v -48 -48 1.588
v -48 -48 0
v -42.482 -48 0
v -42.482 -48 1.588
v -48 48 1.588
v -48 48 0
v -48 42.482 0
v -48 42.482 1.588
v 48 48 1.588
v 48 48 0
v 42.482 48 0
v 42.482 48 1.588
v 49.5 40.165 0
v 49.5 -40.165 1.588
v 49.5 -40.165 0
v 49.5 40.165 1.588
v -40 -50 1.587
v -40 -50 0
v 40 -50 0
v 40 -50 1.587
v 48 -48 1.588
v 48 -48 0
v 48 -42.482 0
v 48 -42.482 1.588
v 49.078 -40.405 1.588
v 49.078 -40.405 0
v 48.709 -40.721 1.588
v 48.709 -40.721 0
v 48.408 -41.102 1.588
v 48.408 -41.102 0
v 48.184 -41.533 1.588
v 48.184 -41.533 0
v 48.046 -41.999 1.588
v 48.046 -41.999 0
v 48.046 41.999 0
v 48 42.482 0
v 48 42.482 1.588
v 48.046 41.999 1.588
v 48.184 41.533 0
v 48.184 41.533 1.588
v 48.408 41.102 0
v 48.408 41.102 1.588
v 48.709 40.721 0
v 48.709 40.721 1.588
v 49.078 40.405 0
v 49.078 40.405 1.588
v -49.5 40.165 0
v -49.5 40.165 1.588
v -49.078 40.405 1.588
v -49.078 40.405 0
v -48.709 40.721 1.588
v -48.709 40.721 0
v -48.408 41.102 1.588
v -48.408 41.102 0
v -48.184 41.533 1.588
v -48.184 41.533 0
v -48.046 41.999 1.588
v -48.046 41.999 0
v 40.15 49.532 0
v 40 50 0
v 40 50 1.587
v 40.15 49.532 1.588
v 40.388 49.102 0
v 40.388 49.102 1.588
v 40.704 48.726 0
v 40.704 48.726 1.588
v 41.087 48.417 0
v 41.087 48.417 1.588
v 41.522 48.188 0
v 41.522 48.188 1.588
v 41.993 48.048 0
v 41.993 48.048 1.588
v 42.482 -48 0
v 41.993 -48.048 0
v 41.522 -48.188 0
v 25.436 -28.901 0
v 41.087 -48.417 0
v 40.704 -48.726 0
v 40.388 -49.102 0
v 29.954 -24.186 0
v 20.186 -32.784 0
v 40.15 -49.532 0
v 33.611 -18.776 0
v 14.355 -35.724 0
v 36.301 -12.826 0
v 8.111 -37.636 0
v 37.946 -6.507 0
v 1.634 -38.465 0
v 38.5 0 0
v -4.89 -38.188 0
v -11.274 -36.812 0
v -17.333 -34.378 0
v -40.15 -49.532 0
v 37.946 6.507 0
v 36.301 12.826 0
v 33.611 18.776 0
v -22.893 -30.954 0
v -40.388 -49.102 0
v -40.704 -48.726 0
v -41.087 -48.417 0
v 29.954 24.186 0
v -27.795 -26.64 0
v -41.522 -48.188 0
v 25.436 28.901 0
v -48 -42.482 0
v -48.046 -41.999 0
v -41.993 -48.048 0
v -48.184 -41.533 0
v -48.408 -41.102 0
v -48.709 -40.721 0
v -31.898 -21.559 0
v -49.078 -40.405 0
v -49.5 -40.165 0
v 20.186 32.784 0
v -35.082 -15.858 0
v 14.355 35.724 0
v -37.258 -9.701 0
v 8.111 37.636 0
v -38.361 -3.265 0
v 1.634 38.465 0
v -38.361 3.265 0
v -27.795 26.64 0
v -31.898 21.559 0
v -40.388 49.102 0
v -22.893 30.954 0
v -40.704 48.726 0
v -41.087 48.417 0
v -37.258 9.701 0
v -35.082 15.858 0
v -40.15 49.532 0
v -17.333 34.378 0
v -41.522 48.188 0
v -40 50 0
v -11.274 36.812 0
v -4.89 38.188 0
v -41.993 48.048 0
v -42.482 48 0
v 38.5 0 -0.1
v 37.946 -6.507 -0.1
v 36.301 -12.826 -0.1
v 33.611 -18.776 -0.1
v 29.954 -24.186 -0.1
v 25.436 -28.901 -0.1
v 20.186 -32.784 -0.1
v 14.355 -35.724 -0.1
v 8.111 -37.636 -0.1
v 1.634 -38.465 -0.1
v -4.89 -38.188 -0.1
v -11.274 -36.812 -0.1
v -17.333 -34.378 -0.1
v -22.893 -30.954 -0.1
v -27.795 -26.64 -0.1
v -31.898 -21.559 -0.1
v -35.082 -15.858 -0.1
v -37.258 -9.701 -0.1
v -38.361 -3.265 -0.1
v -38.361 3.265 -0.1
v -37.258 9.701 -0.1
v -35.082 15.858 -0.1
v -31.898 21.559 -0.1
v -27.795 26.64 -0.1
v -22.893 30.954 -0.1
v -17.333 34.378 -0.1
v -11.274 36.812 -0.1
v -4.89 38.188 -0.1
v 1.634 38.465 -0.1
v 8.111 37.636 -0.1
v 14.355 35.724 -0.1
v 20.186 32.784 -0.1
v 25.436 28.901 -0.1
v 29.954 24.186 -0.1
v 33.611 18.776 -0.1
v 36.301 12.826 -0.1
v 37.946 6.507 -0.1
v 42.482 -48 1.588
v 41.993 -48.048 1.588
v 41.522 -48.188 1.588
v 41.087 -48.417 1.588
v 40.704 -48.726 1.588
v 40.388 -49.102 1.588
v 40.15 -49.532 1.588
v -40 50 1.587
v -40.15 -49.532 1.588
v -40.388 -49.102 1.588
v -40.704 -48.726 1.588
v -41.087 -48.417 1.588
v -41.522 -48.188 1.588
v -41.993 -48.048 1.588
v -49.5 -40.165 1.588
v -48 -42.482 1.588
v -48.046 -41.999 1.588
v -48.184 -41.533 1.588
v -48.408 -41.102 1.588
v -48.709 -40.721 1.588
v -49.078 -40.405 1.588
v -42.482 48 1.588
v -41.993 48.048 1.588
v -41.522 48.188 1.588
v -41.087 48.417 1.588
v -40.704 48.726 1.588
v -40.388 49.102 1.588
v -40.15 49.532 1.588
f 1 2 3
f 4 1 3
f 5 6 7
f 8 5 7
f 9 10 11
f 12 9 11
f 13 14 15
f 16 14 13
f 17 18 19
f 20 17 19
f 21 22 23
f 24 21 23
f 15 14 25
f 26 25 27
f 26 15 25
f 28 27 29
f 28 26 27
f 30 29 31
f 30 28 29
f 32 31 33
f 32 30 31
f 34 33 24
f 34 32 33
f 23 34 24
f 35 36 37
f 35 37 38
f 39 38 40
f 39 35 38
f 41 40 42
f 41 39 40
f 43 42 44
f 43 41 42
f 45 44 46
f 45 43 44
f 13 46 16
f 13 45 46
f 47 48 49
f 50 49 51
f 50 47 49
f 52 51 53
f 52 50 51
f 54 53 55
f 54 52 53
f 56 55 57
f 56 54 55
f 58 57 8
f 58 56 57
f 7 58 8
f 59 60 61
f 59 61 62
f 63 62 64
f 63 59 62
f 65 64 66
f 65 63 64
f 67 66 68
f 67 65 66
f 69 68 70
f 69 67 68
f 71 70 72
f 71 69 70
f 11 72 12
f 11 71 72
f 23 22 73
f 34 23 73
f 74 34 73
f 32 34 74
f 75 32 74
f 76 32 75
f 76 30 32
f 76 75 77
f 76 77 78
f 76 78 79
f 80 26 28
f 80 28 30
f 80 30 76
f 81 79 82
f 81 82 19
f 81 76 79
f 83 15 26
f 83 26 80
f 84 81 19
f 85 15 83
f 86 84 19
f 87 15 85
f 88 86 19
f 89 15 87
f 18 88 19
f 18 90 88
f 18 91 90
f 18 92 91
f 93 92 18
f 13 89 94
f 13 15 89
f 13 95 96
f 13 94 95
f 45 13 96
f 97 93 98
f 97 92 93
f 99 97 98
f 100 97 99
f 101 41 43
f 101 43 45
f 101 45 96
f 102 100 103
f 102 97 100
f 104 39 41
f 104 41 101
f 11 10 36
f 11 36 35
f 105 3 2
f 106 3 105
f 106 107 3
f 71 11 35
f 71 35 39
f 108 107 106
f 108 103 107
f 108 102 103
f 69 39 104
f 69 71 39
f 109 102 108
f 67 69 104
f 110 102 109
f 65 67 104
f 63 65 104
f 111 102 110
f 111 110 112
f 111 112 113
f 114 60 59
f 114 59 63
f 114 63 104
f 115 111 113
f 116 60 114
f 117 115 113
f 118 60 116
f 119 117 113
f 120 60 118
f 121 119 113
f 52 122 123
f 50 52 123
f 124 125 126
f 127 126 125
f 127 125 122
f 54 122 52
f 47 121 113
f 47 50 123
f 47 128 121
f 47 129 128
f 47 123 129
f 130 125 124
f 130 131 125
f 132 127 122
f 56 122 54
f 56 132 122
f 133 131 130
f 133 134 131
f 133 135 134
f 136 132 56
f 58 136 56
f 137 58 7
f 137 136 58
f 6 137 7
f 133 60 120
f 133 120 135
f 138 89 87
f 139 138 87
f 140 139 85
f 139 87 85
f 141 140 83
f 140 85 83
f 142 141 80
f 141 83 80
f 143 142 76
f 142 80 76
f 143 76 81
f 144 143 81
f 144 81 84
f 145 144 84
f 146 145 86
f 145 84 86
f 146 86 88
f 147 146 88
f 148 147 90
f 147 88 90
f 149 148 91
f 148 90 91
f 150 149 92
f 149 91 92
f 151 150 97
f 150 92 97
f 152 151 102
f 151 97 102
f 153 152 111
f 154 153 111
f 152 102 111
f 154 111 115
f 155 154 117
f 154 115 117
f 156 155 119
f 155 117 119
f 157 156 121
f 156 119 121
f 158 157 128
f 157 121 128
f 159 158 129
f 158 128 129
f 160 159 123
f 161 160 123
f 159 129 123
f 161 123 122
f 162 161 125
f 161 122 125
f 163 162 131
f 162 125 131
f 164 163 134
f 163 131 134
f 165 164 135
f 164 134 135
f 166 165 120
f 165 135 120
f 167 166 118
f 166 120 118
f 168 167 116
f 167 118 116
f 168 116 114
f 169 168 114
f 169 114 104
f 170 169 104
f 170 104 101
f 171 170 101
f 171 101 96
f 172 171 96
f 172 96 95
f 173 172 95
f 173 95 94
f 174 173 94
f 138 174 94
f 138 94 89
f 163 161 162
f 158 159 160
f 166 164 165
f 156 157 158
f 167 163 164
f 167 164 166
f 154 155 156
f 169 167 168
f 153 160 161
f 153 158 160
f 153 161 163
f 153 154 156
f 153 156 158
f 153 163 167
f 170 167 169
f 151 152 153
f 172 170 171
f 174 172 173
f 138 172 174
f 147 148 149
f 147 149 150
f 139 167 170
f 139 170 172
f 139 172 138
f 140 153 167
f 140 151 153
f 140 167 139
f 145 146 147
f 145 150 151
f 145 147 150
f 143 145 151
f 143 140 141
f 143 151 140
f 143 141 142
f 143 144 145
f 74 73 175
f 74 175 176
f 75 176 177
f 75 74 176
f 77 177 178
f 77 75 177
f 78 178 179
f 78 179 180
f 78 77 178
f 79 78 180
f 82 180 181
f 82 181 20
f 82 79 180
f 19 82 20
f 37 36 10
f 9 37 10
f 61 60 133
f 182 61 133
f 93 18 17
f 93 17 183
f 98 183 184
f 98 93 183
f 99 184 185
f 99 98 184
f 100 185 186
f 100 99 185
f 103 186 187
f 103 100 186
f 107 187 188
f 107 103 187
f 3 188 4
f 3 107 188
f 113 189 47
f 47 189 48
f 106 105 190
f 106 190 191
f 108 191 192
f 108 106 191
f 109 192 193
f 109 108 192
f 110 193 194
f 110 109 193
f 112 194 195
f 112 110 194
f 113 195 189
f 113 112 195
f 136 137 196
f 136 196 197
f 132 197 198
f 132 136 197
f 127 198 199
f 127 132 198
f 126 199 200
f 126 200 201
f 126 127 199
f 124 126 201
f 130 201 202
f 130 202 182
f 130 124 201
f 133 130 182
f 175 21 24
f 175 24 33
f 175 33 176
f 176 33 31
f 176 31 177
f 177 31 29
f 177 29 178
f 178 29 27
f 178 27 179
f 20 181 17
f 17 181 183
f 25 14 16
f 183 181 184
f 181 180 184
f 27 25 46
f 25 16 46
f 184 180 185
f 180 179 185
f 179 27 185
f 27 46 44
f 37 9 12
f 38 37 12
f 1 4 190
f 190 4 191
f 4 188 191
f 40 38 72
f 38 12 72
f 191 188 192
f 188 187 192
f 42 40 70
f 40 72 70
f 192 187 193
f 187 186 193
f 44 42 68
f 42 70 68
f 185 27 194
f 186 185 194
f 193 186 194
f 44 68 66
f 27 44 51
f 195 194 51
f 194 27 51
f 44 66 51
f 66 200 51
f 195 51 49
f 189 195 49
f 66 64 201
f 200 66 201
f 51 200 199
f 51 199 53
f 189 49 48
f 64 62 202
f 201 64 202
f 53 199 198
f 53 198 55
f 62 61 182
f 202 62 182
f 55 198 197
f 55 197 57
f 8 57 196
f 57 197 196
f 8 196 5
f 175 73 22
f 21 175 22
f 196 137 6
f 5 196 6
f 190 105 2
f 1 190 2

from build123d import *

# Parameters (mm, degrees)
BOSS_EXTRUDE1_DEPTH = 1.5875
FILLET1_R           = 2.54
SKETCH6_OUTSIDE_W   = 130.286
SKETCH6_OUTSIDE_H   = 130.286
SKETCH6_OUTSIDE_W_2 = 99
SKETCH6_OUTSIDE_H_2 = 100
CUT_EXTRUDE2_DEPTH  = 71.728496069
SKETCH7_R           = 38.5
BOSS_EXTRUDE2_DEPTH = 0.1


with BuildPart() as part:
    # Sketch1 → Boss-Extrude1 (new body)
    with BuildSketch(Plane.XY):
        Polygon((40, 50), (-40, 50), (-40, 48), (-48, 48), (-48, 40), (-50, 40), (-50, -37.864895224), (-50, -40), (-48, -40), (-48, -48), (-40, -48), (-40, -50), (-37.864895224, -50), (40, -50), (40, -48), (48, -48), (48, -40), (50, -40), (50, 40), (48, 40), (48, 48), (40, 48), align=None)
    extrude(amount=BOSS_EXTRUDE1_DEPTH)

    # Fillet1
    # the kernel refuses this fillet: 2.54 mm, written as the material it adds along each edge
    with BuildSketch(Plane(origin=(-48, -40, 0), x_dir=(0, -1, 0), z_dir=(0, 0, 1)), Plane(origin=(40, -48, 0), x_dir=(1, 0, 0), z_dir=(0, 0, 1)), Plane(origin=(48, 40, 0), x_dir=(0, 1, 0), z_dir=(0, 0, 1)), Plane(origin=(-40, 48, 0), x_dir=(-1, 0, 0), z_dir=(0, 0, 1))) as fillet1_piece_1:
        with BuildLine():
            CenterArc((2.481934729, -2.54), FILLET1_R, 90, 77.725329785)
            Line((0, -2), (-0.049638695, -1.9892))
            ThreePointArc((-0.049638695, -1.9892), (-0.0508, -1), (-0.0508, 0))
            Line((-0.0508, 0), (0, 0.0508))
            Line((0, 0.0508), (2.481934729, 0.0508))
            Line((2.481934729, 0.0508), (2.481934729, 0))
        make_face()
    extrude(amount=1.5875)
    with BuildSketch(Plane(origin=(-40, -48, 0), x_dir=(-3.737454790095179e-12, -1.0, 0), z_dir=(0, 0, 1)), Plane(origin=(48, -40, 0), x_dir=(1.0, -3.7339020764163554e-12, 0), z_dir=(0, 0, 1)), Plane(origin=(-48, 40, 0), x_dir=(-1.0, 3.737454790095126e-12, 0), z_dir=(0, 0, 1))) as fillet1_piece_2:
        with BuildLine():
            CenterArc((2.54, -2.481934729), FILLET1_R, 102.274670215, 77.725329785)
            Line((0, -2.481934729), (-0.0508, -2.481934729))
            Line((-0.0508, -2.481934729), (-0.0508, 0))
            Line((-0.0508, 0), (0, 0.0508))
            ThreePointArc((0, 0.0508), (1, 0.0508), (1.9892, 0.049638695))
            Line((1.9892, 0.049638695), (2, 0))
        make_face()
    extrude(amount=1.5875)
    with BuildSketch(Plane(origin=(40, 48, 0), x_dir=(1, 0, 0), z_dir=(0, 0, 1))) as fillet1_piece_3:
        with BuildLine():
            CenterArc((2.481934729, 2.54), FILLET1_R, 192.274670215, 77.725329785)
            Line((0, 2), (-0.049638695, 1.9892))
            ThreePointArc((-0.049638695, 1.9892), (-0.0508, 1), (-0.0508, 0))
            Line((-0.0508, 0), (0, -0.0508))
            Line((0, -0.0508), (2.481934729, -0.0508))
            Line((2.481934729, -0.0508), (2.481934729, 0))
        make_face()
    extrude(amount=1.5875)

    # Sketch6 outside → Cut-Extrude2 (cut, through all)
    with BuildSketch(Plane.XY.offset(1.5875)):
        Rectangle(SKETCH6_OUTSIDE_W, SKETCH6_OUTSIDE_H)
        Rectangle(SKETCH6_OUTSIDE_W_2, SKETCH6_OUTSIDE_H_2, mode=Mode.SUBTRACT)
    extrude(amount=-CUT_EXTRUDE2_DEPTH, mode=Mode.SUBTRACT)

    # Sketch7 → Boss-Extrude2 (add)
    with BuildSketch(Plane(origin=(0, 0, 0), x_dir=(-1, 0, 0), z_dir=(0, 0, -1))):
        with Locations(Location((0, 0, 0), (0, 0, 180))):
            Circle(SKETCH7_R)
    extrude(amount=BOSS_EXTRUDE2_DEPTH)


solid = part.part
